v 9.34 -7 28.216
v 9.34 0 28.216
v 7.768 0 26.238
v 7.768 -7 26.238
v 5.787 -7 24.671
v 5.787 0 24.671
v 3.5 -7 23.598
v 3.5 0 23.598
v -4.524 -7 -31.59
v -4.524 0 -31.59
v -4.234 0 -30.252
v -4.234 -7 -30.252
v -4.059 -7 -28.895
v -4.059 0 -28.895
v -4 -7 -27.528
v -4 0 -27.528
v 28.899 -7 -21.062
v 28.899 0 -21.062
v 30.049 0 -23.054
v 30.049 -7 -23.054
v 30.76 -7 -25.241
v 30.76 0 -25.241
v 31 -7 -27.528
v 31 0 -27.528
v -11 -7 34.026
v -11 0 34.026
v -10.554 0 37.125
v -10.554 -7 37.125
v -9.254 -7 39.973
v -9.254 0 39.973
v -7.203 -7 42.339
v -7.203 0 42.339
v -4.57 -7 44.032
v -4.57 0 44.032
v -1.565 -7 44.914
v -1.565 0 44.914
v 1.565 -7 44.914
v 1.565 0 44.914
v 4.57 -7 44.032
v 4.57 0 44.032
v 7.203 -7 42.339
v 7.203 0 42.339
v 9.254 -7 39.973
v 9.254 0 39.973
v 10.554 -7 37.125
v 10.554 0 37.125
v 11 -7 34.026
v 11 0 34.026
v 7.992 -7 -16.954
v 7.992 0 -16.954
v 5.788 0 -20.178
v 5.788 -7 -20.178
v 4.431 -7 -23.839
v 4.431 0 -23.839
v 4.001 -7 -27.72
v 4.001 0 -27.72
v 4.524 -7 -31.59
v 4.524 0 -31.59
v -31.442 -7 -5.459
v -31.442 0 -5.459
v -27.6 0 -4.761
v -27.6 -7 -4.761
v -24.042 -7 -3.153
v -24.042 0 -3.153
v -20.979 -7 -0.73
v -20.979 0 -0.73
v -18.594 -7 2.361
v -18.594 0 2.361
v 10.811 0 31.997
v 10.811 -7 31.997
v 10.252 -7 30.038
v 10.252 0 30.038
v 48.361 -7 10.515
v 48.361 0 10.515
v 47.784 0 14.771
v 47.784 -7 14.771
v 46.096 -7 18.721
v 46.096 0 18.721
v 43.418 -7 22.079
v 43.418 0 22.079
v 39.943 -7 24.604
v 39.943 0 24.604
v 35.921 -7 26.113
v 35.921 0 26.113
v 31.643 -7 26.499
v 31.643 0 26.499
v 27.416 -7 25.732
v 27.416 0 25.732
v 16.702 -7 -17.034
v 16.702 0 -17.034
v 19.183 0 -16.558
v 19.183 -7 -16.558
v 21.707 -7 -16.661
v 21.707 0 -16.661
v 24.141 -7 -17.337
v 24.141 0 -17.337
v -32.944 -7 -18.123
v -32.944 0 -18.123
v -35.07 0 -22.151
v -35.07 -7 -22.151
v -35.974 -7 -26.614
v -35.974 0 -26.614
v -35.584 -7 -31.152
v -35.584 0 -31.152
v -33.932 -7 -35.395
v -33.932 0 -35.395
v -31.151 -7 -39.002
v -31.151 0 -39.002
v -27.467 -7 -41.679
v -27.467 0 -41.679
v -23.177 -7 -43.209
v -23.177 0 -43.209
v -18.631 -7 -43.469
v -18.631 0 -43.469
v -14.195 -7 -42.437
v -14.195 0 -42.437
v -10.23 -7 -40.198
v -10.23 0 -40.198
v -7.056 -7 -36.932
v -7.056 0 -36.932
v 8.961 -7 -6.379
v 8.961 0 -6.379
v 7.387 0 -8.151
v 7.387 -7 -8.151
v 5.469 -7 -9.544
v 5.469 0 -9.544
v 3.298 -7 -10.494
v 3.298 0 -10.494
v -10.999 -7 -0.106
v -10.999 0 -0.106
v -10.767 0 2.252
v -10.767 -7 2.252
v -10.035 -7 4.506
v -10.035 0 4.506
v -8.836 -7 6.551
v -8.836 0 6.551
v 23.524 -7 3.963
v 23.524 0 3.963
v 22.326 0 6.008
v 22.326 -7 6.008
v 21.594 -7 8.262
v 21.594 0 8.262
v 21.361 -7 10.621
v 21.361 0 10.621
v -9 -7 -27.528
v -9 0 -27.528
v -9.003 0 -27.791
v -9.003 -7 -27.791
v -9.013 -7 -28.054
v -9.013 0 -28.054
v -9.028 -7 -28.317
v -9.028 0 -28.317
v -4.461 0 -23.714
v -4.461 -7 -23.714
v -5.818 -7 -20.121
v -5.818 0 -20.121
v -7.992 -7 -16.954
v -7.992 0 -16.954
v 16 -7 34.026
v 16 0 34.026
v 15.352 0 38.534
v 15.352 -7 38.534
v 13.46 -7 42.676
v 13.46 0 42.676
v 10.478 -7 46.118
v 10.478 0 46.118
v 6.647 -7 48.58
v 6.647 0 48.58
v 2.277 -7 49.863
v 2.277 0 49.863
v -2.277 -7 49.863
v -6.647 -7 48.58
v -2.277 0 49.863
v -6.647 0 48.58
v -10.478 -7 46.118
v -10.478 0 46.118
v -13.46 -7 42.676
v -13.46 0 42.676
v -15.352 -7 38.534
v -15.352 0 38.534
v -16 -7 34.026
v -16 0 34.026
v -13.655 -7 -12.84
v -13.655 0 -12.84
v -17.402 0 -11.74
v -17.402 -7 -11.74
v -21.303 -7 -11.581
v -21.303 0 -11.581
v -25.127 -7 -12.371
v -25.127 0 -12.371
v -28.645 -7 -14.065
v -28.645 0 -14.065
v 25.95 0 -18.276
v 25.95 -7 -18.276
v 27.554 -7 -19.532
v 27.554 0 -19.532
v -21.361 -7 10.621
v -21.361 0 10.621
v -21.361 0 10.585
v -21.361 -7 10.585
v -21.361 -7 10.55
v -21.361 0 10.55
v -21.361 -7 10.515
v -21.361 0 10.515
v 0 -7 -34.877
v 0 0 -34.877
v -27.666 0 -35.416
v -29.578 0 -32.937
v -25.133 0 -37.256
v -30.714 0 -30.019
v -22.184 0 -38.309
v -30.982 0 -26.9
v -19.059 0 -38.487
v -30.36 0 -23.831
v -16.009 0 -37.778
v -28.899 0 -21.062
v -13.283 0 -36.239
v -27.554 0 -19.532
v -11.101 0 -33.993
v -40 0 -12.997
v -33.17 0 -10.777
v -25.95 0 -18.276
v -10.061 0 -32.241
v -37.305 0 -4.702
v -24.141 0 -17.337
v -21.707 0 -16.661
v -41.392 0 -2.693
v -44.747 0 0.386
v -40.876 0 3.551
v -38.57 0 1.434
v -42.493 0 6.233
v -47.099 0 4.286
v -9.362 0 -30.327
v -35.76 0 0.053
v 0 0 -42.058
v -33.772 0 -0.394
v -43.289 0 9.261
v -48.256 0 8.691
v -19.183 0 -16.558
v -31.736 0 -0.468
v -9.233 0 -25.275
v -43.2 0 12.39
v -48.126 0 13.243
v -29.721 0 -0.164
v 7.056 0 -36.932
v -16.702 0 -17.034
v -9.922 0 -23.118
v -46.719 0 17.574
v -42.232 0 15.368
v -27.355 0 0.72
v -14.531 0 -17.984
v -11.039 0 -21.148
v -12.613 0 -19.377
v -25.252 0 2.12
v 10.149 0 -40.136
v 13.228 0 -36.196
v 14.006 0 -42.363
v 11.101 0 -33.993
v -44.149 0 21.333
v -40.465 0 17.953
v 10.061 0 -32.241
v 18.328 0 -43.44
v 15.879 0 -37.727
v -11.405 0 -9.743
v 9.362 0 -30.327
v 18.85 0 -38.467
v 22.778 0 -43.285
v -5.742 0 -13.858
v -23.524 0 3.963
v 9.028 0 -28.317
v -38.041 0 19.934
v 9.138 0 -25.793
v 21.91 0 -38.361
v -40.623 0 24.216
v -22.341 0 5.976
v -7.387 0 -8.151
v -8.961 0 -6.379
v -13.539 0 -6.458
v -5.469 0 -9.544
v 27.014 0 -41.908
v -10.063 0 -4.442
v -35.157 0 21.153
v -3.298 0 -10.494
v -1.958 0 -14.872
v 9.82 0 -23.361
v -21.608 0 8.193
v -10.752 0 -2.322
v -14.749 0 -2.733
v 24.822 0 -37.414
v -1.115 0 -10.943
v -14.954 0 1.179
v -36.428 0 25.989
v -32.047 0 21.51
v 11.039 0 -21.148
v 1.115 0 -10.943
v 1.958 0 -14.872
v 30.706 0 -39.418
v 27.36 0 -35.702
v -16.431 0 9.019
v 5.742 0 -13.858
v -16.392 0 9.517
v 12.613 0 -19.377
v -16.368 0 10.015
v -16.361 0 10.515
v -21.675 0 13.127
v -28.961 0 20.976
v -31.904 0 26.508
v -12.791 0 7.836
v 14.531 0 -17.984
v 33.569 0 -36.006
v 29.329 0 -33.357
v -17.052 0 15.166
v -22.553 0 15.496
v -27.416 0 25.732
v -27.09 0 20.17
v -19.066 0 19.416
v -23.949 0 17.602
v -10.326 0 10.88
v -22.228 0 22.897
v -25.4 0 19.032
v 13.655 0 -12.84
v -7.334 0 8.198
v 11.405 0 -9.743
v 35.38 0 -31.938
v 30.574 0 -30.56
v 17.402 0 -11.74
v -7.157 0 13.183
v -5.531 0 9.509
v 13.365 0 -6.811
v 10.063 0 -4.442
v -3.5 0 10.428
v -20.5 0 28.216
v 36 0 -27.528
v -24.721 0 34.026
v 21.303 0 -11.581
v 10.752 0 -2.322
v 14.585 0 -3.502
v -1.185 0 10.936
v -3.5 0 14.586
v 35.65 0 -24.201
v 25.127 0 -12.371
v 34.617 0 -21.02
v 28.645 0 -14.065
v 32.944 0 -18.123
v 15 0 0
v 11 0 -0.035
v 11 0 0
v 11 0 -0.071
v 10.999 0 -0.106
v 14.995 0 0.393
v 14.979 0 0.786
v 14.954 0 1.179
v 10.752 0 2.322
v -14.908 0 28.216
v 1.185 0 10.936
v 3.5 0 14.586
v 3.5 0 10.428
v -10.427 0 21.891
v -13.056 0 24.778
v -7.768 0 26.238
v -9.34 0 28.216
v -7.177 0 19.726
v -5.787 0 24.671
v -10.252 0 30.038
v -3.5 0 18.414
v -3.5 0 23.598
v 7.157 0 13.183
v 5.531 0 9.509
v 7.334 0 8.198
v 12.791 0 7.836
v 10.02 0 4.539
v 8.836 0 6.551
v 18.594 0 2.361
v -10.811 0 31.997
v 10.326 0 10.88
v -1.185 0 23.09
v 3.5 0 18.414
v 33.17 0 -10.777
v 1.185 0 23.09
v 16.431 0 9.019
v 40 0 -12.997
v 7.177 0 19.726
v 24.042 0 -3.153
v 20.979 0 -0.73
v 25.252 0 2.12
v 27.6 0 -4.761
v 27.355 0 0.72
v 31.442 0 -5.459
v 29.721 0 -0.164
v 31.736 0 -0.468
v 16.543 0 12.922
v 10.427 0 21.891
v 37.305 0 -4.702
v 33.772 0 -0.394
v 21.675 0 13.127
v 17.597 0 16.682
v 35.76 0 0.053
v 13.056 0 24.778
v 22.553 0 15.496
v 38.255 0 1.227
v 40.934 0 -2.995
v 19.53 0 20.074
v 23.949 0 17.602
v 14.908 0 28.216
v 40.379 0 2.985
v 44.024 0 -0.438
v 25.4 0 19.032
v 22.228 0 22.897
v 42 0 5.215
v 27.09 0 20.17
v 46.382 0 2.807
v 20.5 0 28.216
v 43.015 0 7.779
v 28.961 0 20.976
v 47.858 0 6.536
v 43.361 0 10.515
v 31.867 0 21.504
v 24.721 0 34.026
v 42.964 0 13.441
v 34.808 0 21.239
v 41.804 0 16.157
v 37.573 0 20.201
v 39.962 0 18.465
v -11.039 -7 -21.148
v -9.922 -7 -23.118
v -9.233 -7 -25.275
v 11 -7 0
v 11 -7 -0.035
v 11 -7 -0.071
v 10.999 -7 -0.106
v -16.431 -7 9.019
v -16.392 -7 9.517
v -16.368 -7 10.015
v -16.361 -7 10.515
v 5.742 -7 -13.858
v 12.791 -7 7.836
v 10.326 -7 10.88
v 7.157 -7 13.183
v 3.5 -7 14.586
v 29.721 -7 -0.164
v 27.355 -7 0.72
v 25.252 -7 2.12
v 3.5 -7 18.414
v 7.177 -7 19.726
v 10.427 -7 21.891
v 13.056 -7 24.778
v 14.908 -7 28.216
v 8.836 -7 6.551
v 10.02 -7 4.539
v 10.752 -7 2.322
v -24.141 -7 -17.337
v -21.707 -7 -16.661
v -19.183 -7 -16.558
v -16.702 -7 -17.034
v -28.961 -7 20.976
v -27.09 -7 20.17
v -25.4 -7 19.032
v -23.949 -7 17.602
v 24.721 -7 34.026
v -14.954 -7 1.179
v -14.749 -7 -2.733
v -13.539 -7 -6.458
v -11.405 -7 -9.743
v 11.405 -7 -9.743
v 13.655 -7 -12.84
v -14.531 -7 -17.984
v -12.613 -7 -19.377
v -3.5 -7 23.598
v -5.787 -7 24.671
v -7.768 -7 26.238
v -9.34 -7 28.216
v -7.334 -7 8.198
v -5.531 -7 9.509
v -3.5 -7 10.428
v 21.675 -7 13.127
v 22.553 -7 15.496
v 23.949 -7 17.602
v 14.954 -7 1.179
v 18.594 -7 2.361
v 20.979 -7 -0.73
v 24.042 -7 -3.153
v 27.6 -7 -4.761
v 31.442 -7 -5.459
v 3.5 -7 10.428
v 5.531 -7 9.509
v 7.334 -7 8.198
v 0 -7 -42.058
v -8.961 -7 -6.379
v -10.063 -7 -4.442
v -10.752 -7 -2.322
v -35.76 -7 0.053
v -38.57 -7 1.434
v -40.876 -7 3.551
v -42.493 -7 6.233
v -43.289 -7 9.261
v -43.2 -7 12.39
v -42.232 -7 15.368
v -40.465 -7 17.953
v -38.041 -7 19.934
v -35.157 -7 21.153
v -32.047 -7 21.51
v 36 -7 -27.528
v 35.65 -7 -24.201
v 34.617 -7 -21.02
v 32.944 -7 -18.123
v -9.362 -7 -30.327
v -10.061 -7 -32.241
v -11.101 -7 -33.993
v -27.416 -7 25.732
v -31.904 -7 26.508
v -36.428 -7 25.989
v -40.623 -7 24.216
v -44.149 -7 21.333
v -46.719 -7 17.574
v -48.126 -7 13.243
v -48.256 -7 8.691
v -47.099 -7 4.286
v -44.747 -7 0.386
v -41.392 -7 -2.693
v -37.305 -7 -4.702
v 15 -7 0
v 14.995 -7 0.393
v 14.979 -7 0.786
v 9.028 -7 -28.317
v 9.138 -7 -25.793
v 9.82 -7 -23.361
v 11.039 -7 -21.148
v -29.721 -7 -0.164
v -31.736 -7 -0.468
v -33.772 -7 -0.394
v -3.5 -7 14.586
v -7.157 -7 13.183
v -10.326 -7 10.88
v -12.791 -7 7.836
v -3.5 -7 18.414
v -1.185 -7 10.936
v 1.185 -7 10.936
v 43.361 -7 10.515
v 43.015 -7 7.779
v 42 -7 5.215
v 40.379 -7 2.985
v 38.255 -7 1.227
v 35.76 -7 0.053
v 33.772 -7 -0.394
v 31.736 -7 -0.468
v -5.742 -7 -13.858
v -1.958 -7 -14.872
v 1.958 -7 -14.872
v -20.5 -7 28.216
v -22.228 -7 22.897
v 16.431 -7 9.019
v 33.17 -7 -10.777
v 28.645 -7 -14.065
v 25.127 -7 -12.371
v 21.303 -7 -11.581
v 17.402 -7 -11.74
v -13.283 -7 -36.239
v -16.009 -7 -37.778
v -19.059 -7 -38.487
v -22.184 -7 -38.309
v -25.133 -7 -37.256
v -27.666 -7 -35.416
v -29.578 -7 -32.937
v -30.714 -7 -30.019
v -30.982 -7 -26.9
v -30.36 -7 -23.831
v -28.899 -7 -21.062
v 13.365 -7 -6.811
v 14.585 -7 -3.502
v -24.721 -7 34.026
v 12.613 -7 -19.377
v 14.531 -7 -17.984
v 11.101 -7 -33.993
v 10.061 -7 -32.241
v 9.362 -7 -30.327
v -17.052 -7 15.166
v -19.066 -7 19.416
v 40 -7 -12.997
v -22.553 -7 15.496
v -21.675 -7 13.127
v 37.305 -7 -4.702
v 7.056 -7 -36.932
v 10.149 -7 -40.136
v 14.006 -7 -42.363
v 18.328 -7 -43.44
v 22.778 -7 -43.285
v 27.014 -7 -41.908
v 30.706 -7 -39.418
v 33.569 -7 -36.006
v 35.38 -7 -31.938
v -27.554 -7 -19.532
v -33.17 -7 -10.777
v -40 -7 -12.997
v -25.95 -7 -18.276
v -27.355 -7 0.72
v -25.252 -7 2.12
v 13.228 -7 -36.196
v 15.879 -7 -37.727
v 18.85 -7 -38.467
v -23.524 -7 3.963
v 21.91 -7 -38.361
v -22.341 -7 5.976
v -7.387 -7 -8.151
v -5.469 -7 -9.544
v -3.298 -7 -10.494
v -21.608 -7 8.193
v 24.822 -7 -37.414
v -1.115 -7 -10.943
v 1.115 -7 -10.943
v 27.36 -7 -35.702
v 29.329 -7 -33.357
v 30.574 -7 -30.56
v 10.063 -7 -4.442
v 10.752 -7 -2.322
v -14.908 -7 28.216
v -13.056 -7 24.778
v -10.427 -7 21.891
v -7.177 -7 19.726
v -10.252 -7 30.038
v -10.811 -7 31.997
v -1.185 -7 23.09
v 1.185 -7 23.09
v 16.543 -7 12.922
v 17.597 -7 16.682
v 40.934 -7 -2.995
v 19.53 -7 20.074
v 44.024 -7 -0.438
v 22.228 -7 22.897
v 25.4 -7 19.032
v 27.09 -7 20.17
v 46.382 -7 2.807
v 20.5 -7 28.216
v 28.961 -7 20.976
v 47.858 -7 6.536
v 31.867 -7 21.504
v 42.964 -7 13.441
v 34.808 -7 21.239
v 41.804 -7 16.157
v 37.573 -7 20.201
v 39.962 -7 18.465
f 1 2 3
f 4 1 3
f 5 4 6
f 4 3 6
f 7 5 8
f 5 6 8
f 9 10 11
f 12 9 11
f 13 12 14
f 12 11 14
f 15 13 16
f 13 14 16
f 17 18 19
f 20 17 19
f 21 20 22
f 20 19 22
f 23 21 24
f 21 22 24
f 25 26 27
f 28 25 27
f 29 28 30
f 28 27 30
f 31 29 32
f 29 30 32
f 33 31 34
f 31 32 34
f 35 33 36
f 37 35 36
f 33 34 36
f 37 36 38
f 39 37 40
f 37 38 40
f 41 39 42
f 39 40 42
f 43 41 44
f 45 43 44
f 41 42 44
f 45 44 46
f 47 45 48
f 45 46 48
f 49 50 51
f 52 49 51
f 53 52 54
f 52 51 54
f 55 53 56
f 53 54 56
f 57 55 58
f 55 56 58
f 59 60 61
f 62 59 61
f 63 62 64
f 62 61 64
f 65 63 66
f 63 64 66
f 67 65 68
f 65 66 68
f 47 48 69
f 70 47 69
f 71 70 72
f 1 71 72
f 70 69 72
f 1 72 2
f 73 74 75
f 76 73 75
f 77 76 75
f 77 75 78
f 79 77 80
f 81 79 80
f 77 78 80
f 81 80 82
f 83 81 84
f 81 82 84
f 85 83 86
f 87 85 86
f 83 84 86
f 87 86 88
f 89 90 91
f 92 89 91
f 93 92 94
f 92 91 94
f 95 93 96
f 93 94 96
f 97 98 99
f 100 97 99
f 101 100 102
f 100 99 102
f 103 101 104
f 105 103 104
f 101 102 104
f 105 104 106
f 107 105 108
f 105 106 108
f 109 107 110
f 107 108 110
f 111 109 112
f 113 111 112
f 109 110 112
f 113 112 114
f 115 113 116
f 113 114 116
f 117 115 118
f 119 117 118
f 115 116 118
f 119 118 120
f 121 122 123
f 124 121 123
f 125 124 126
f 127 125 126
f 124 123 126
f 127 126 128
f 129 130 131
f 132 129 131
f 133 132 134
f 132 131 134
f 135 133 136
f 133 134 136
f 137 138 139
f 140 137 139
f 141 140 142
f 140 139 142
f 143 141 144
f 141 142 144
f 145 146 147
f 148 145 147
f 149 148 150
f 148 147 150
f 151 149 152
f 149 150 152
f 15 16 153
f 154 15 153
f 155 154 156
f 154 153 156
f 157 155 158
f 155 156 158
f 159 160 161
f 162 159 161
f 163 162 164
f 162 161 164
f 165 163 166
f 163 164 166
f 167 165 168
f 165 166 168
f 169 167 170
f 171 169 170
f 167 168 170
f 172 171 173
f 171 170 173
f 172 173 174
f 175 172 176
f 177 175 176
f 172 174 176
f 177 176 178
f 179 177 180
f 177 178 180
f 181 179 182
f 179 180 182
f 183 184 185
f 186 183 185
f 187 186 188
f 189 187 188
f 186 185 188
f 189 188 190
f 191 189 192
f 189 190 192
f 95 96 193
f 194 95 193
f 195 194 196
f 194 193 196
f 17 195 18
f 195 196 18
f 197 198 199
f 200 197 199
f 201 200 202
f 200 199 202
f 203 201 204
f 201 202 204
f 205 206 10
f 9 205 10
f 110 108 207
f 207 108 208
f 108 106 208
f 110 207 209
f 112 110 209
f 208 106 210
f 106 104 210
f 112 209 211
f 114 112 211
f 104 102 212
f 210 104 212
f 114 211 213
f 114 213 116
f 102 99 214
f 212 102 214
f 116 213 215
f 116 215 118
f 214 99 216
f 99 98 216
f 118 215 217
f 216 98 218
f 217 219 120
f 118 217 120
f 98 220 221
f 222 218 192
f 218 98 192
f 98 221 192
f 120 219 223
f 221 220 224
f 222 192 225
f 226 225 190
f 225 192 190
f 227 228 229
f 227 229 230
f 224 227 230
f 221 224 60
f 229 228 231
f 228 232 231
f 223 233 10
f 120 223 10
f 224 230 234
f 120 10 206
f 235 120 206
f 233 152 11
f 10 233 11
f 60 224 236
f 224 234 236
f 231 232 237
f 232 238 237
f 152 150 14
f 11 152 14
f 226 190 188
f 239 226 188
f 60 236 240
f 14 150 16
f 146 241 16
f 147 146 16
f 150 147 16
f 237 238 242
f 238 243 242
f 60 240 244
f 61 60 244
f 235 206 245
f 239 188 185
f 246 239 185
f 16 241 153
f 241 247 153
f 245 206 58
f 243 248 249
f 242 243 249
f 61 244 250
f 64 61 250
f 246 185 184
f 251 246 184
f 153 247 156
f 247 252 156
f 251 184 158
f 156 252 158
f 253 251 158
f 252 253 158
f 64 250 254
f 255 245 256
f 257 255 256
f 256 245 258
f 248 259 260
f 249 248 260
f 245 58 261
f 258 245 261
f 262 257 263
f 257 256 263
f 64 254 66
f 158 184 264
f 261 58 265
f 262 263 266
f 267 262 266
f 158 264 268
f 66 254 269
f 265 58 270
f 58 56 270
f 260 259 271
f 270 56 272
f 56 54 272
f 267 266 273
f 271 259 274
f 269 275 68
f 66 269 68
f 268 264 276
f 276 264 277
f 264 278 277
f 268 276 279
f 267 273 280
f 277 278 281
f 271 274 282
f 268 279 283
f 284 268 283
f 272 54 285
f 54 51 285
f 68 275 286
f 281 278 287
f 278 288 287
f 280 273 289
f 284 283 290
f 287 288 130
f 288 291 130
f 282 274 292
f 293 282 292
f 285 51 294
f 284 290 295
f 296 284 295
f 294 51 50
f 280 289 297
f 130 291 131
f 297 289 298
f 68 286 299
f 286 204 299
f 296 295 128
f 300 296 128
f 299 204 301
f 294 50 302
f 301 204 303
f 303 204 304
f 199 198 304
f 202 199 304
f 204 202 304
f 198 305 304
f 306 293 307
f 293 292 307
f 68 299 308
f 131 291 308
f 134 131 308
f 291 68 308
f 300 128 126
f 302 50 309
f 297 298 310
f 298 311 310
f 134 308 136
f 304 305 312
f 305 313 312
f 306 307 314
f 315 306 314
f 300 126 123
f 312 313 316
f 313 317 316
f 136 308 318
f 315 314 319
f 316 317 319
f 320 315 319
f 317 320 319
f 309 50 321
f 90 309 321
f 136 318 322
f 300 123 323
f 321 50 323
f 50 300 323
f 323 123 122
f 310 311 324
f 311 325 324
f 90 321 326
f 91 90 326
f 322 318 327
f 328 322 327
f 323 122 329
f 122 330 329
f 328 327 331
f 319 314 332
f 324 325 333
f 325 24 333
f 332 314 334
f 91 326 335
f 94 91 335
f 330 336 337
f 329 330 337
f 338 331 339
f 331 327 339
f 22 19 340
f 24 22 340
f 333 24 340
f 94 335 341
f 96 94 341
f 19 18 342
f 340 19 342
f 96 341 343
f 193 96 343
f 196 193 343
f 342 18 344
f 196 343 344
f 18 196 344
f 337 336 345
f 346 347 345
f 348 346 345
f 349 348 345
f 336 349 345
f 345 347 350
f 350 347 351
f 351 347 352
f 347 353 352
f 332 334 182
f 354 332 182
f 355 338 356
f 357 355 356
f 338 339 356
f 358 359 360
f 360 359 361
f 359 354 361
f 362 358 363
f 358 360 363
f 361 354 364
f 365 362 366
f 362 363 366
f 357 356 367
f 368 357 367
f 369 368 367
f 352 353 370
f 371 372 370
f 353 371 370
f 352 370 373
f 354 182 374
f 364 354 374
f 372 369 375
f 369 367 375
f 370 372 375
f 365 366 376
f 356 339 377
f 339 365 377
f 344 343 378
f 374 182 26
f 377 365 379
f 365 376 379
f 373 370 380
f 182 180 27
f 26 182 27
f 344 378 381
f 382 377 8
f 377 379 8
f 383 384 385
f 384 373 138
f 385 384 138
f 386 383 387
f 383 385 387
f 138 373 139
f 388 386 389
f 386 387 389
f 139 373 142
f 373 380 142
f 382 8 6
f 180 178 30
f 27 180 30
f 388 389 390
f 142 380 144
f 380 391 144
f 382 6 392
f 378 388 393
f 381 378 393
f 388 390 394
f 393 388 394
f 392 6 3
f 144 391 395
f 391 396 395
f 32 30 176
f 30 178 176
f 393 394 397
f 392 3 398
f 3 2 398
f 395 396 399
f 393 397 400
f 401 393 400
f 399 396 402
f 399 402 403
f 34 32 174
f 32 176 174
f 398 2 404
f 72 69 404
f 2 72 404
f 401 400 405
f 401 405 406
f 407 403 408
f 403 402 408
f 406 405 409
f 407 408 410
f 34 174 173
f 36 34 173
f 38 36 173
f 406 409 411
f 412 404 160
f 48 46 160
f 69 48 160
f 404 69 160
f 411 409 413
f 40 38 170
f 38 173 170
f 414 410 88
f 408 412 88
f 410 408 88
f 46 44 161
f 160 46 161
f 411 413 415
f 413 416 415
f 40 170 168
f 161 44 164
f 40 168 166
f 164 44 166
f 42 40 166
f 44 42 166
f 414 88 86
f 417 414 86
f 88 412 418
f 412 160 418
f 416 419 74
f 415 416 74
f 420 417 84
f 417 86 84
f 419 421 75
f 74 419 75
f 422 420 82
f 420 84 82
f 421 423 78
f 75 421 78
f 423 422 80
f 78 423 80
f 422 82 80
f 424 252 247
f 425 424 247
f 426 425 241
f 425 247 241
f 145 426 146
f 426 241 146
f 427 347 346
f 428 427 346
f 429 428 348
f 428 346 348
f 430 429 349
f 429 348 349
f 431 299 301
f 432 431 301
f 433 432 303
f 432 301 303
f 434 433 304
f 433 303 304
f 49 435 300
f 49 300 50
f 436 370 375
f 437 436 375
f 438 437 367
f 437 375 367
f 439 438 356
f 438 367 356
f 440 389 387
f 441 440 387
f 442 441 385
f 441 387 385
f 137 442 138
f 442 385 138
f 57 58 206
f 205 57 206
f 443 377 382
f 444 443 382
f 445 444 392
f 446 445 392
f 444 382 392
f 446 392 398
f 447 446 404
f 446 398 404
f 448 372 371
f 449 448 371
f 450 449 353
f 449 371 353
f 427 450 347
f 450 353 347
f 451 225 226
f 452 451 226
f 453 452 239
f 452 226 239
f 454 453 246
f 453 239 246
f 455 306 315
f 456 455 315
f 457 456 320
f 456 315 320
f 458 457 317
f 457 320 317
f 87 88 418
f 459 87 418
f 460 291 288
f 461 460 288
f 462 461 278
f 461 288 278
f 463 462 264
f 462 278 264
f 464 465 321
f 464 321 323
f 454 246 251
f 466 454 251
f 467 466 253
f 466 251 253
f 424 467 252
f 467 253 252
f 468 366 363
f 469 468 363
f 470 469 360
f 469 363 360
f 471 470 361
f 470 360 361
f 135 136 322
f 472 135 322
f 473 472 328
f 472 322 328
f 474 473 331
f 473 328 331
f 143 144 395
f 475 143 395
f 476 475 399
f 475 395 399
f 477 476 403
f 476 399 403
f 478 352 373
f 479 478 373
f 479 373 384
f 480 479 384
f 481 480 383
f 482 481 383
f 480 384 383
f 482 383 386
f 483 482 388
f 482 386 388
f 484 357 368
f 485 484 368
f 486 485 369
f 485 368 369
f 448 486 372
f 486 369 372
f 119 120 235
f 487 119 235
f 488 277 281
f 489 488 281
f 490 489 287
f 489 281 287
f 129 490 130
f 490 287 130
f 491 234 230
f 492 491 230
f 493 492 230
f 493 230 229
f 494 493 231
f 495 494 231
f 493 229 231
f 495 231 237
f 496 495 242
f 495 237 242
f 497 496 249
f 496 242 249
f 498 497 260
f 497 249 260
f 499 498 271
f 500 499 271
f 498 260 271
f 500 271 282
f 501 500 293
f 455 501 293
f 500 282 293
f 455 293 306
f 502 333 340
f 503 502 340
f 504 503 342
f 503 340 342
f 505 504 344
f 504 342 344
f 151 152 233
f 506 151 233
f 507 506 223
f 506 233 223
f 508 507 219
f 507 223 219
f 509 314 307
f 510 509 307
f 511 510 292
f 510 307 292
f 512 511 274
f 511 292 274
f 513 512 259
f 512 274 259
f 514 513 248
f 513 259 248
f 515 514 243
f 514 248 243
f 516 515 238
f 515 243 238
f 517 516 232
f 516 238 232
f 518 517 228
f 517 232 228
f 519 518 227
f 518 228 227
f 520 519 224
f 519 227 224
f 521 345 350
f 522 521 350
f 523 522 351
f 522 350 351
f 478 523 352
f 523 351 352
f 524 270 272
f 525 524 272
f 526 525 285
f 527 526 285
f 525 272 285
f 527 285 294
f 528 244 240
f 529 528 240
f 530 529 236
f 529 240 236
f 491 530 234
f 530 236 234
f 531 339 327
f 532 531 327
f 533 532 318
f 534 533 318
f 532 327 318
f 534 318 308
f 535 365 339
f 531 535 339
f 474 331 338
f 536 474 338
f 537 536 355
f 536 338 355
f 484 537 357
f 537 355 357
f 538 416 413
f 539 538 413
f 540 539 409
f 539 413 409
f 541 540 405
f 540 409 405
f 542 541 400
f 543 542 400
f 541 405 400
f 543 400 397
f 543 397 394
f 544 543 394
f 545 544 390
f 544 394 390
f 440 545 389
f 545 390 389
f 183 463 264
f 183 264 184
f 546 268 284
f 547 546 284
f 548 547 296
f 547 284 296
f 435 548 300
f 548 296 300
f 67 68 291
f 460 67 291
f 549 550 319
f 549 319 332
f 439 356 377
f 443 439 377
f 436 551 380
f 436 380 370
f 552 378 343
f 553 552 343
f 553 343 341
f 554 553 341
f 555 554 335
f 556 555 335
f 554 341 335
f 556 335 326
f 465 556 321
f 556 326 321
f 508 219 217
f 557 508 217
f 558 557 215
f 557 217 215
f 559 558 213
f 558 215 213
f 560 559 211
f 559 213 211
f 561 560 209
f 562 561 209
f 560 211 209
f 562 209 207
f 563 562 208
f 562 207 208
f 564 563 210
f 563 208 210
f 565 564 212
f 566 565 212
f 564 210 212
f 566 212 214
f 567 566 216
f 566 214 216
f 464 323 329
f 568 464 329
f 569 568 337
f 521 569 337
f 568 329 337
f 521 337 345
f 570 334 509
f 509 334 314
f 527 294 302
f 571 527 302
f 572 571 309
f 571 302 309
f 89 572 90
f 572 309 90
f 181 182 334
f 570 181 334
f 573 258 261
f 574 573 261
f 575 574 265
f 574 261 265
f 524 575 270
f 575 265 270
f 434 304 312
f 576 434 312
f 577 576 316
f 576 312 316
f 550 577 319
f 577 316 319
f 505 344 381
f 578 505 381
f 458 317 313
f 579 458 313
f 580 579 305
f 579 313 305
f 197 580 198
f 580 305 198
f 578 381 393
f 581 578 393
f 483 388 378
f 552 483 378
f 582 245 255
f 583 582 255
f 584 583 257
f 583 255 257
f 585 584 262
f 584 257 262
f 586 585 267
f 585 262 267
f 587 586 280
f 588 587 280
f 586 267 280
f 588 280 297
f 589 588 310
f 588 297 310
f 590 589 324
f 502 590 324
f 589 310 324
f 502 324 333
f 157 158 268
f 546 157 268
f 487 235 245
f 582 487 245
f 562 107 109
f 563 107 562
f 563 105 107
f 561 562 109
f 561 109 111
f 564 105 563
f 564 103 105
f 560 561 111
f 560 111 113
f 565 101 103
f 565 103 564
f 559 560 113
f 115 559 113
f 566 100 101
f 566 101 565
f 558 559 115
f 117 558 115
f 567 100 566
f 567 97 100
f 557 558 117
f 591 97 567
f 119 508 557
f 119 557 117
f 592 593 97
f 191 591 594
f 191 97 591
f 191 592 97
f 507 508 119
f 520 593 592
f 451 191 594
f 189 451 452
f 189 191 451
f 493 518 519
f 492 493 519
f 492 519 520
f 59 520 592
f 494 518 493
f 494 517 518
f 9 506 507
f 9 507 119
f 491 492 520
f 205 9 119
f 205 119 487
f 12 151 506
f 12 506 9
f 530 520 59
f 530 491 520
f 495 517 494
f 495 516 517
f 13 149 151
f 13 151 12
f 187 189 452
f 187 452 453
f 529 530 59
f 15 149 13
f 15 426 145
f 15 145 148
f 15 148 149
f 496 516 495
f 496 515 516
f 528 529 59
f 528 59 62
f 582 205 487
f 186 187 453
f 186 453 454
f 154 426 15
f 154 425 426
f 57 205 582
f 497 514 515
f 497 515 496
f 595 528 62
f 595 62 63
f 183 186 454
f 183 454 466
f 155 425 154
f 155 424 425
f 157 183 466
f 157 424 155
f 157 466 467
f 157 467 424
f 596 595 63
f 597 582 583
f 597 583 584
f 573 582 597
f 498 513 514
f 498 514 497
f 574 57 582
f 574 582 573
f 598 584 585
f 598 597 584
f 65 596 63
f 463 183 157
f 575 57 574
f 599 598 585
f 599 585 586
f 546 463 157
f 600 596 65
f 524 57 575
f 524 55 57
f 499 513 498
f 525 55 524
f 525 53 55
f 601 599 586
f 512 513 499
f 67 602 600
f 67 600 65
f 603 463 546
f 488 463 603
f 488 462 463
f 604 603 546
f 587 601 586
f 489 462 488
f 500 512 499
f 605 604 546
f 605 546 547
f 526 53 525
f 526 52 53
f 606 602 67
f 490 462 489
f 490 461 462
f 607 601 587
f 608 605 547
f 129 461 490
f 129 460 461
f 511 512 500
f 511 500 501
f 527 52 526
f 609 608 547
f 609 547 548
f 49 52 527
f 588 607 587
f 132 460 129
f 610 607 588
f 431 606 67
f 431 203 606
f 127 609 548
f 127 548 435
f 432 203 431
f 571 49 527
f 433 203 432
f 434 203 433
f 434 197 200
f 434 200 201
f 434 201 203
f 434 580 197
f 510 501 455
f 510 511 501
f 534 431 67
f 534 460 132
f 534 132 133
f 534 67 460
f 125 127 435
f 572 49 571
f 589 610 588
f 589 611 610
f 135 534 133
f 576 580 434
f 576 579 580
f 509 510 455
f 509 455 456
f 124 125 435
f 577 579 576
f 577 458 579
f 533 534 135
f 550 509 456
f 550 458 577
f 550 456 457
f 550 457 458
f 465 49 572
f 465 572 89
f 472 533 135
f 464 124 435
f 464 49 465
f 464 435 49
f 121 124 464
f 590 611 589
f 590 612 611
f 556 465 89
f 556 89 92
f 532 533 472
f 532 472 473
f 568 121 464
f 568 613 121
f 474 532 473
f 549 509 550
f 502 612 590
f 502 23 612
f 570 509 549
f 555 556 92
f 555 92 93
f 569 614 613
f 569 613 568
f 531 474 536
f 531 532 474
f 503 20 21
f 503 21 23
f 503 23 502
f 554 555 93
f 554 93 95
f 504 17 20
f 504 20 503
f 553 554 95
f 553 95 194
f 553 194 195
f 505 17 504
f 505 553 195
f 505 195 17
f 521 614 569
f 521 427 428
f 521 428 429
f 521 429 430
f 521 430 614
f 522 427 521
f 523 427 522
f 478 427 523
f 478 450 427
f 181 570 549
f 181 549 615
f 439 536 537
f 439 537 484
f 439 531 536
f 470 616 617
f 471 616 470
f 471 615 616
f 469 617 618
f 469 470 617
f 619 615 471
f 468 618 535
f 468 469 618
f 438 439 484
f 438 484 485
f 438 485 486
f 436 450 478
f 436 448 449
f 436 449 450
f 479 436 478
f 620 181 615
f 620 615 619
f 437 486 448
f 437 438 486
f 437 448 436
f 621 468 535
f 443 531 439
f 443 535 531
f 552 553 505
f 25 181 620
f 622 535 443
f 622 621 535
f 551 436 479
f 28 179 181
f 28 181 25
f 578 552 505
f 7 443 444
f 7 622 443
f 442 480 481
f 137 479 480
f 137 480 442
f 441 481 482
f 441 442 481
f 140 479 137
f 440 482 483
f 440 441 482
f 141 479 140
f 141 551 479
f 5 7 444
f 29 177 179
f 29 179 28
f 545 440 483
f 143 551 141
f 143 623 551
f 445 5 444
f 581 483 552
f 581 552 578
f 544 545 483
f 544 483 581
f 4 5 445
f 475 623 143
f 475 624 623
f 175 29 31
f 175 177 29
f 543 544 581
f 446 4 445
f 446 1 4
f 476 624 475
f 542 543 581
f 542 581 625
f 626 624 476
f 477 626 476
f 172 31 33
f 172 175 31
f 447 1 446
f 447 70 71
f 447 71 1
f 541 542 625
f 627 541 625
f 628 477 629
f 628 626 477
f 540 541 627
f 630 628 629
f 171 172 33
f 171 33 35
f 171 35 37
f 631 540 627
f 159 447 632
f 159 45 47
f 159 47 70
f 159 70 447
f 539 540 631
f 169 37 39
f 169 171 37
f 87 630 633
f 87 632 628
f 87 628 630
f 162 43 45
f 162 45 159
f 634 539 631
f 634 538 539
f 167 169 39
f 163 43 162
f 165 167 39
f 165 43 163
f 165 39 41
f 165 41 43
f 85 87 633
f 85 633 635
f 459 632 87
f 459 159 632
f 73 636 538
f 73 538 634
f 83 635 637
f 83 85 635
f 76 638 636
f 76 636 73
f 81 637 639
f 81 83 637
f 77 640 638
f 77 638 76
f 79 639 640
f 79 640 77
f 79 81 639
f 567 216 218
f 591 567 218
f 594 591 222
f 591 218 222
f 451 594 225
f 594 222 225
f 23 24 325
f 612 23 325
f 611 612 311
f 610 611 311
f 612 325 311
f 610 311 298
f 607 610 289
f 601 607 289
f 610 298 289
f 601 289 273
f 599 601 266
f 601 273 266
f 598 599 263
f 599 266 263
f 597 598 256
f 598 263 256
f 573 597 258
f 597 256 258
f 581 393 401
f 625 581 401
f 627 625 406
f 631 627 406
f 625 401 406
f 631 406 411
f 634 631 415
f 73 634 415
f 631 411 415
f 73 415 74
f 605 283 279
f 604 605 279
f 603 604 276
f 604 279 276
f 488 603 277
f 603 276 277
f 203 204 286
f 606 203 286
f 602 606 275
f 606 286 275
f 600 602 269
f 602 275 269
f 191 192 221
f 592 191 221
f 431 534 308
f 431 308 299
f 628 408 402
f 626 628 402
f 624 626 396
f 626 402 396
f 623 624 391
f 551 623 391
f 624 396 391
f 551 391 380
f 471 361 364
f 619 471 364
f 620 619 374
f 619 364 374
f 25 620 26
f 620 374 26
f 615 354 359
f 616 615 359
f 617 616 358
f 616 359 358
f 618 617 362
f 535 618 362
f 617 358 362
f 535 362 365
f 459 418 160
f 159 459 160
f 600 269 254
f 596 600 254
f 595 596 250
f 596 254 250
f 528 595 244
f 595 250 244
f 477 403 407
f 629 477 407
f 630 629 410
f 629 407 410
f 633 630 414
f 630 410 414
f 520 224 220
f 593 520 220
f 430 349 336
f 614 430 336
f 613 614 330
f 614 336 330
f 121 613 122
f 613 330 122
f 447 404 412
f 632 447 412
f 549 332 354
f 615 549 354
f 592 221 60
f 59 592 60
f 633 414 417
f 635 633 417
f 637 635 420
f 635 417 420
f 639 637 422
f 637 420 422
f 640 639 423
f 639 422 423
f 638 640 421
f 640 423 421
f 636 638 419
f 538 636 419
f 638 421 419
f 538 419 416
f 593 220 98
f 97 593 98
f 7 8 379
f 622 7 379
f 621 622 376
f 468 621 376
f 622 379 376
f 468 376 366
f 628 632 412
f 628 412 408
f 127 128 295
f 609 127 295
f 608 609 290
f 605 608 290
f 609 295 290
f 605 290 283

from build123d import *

# Parameters (mm, degrees)
F1_DEPTH = 7


with BuildPart() as f1:
    # F0 (on Front) → F1 (new body)
    with BuildSketch(Plane.XZ):
        with BuildLine():
            ThreePointArc((48.360679775, 10.5146222424), (41.7652438117, 23.4588941524), (27.416407865, 25.7315265031))
            Line((27.416407865, 25.7315265031), (28.9614928369, 20.9762439216))
            ThreePointArc((28.9614928369, 20.9762439216), (38.8263175502, 19.4138091805), (43.360679775, 10.5146222424))
            ThreePointArc((43.360679775, 10.5146222424), (41.2598667131, 4.0489844672), (35.7598667131, 0.0530005631))
            Line((35.7598667131, 0.0530005631), (37.304951685, -4.7022820183))
            ThreePointArc((37.304951685, -4.7022820183), (45.304951685, 1.1100582057), (48.360679775, 10.5146222424))
        make_face()
        with BuildLine():
            ThreePointArc((27.416407865, 25.7315265031), (24.6902095954, 24.5561281169), (22.2280947787, 22.8973005186))
            Line((22.2280947787, 22.8973005186), (23.9485313704, 17.6023411434))
            ThreePointArc((23.9485313704, 17.6023411434), (26.2187976829, 19.6402610894), (28.9614928369, 20.9762439216))
            Line((28.9614928369, 20.9762439216), (27.416407865, 25.7315265031))
        make_face()
        with BuildLine():
            ThreePointArc((22.2280947787, 22.8973005186), (17.5969797386, 16.6817253902), (16.4307551931, 9.0187937711))
            Line((16.4307551931, 9.0187937711), (21.3611921305, 10.6207898431))
            ThreePointArc((21.3611921305, 10.6207898431), (22.0462036291, 14.3371321293), (23.9485313704, 17.6023411434))
            Line((23.9485313704, 17.6023411434), (22.2280947787, 22.8973005186))
        make_face()
        with BuildLine():
            Line((21.3611921305, 10.6207898431), (16.4307551931, 9.0187937711))
            ThreePointArc((16.4307551931, 9.0187937711), (17.1437755143, 5.5703503324), (18.5938741537, 2.361398157))
            Line((18.5938741537, 2.361398157), (23.5243110912, 3.963394229))
            ThreePointArc((23.5243110912, 3.963394229), (21.8990580958, 7.1154353043), (21.3611921305, 10.6207898431))
        make_face()
        with BuildLine():
            Line((29.7211653989, -0.1639995722), (31.4416019907, -5.4589589474))
            ThreePointArc((31.4416019907, -5.4589589474), (34.4085291179, -5.3537838864), (37.304951685, -4.7022820183))
            Line((37.304951685, -4.7022820183), (35.7598667131, 0.0530005631))
            ThreePointArc((35.7598667131, 0.0530005631), (32.7557087171, -0.4782823845), (29.7211653989, -0.1639995722))
        make_face()
        with BuildLine():
            Line((23.5243110912, 3.963394229), (18.5938741537, 2.361398157))
            ThreePointArc((18.5938741537, 2.361398157), (24.0415278254, -3.1525541609), (31.4416019907, -5.4589589474))
            Line((31.4416019907, -5.4589589474), (29.7211653989, -0.1639995722))
            ThreePointArc((29.7211653989, -0.1639995722), (26.2629082231, 1.359449819), (23.5243110912, 3.963394229))
        make_face()
        with BuildLine():
            ThreePointArc((37.304951685, -4.7022820183), (34.4085291179, -5.3537838864), (31.4416019907, -5.4589589474))
            Line((31.4416019907, -5.4589589474), (33.1696967694, -10.7774877984))
            Line((33.1696967694, -10.7774877984), (28.645485903, -14.0645193985))
            ThreePointArc((28.645485903, -14.0645193985), (30.9839600202, -15.8935238202), (32.94427191, -18.1230743727))
            Line((32.94427191, -18.1230743727), (40, -12.9967878493))
            Line((40, -12.9967878493), (37.304951685, -4.7022820183))
        make_face()
        with BuildLine():
            ThreePointArc((36, -27.5276384094), (35.2169042607, -22.5833664994), (32.94427191, -18.1230743727))
            Line((32.94427191, -18.1230743727), (28.8991869381, -21.0620006342))
            ThreePointArc((28.8991869381, -21.0620006342), (30.4616216792, -24.1284514713), (31, -27.5276384094))
            ThreePointArc((31, -27.5276384094), (23.3991869381, -37.9892600887), (11.1008130619, -33.9932761846))
            Line((11.1008130619, -33.9932761846), (7.05572809, -36.9322024461))
            ThreePointArc((7.05572809, -36.9322024461), (24.94427191, -42.7445426701), (36, -27.5276384094))
        make_face()
        with BuildLine():
            ThreePointArc((32.94427191, -18.1230743727), (30.9839600202, -15.8935238202), (28.645485903, -14.0645193985))
            Line((28.645485903, -14.0645193985), (24.1413244303, -17.3369842615))
            ThreePointArc((24.1413244303, -17.3369842615), (26.7810523469, -18.8663839351), (28.8991869381, -21.0620006342))
            Line((28.8991869381, -21.0620006342), (32.94427191, -18.1230743727))
        make_face()
        with BuildLine():
            ThreePointArc((28.645485903, -14.0645193985), (21.3030294243, -11.5807856065), (13.6547651702, -12.83961625))
            Line((13.6547651702, -12.83961625), (16.7019427769, -17.0336964164))
            ThreePointArc((16.7019427769, -17.0336964164), (20.4480745194, -16.5367681425), (24.1413244303, -17.3369842615))
            Line((24.1413244303, -17.3369842615), (28.645485903, -14.0645193985))
        make_face()
        with BuildLine():
            Line((16.7019427769, -17.0336964164), (13.6547651702, -12.83961625))
            ThreePointArc((13.6547651702, -12.83961625), (10.5954359633, -14.5833664994), (7.9916462096, -16.9541130161))
            Line((7.9916462096, -16.9541130161), (11.0388238163, -21.1481931824))
            ThreePointArc((11.0388238163, -21.1481931824), (13.5343622248, -18.6284514713), (16.7019427769, -17.0336964164))
        make_face()
        with BuildLine():
            Line((11.0388238163, -21.1481931824), (7.9916462096, -16.9541130161))
            ThreePointArc((7.9916462096, -16.9541130161), (4.4309834911, -23.8390445115), (4.5242108664, -31.5896515423))
            Line((4.5242108664, -31.5896515423), (9.0283723391, -28.3171866794))
            ThreePointArc((9.0283723391, -28.3171866794), (9.4085985716, -24.5574169054), (11.0388238163, -21.1481931824))
        make_face()
        with BuildLine():
            Line((9.0283723391, -28.3171866794), (4.5242108664, -31.5896515423))
            ThreePointArc((4.5242108664, -31.5896515423), (5.5410691968, -34.3788660388), (7.05572809, -36.9322024461))
            Line((7.05572809, -36.9322024461), (11.1008130619, -33.9932761846))
            ThreePointArc((11.1008130619, -33.9932761846), (9.667197078, -31.3003276061), (9.0283723391, -28.3171866794))
        make_face()
        with BuildLine():
            ThreePointArc((-7.05572809, -36.9322024461), (-5.5410691968, -34.3788660388), (-4.5242108664, -31.5896515423))
            Line((-4.5242108664, -31.5896515423), (-9.0283723391, -28.3171866794))
            ThreePointArc((-9.0283723391, -28.3171866794), (-9.667197078, -31.3003276061), (-11.1008130619, -33.9932761846))
            Line((-11.1008130619, -33.9932761846), (-7.05572809, -36.9322024461))
        make_face()
        with BuildLine():
            Line((-28.8991869381, -21.0620006342), (-32.94427191, -18.1230743727))
            ThreePointArc((-32.94427191, -18.1230743727), (-29.4045640367, -40.4719103194), (-7.05572809, -36.9322024461))
            Line((-7.05572809, -36.9322024461), (-11.1008130619, -33.9932761846))
            ThreePointArc((-11.1008130619, -33.9932761846), (-26.4656377752, -36.4268253475), (-28.8991869381, -21.0620006342))
        make_face()
        with BuildLine():
            ThreePointArc((-4, -27.5276384094), (-5.031137975, -21.8766942692), (-7.9916462096, -16.9541130161))
            Line((-7.9916462096, -16.9541130161), (-11.0388238163, -21.1481931824))
            ThreePointArc((-11.0388238163, -21.1481931824), (-9.5220961538, -24.1789773353), (-9, -27.5276384094))
            ThreePointArc((-9, -27.5276384094), (-9.0070953732, -27.9226673515), (-9.0283723391, -28.3171866794))
            Line((-9.0283723391, -28.3171866794), (-4.5242108664, -31.5896515423))
            ThreePointArc((-4.5242108664, -31.5896515423), (-4.1315938712, -29.5754877523), (-4, -27.5276384094))
        make_face()
        with BuildLine():
            Line((-11.0388238163, -21.1481931824), (-7.9916462096, -16.9541130161))
            ThreePointArc((-7.9916462096, -16.9541130161), (-10.5954359633, -14.5833664994), (-13.6547651702, -12.83961625))
            Line((-13.6547651702, -12.83961625), (-16.7019427769, -17.0336964164))
            ThreePointArc((-16.7019427769, -17.0336964164), (-13.5343622248, -18.6284514713), (-11.0388238163, -21.1481931824))
        make_face()
        with BuildLine():
            Line((-16.7019427769, -17.0336964164), (-13.6547651702, -12.83961625))
            ThreePointArc((-13.6547651702, -12.83961625), (-21.3030294243, -11.5807856065), (-28.645485903, -14.0645193985))
            Line((-28.645485903, -14.0645193985), (-24.1413244303, -17.3369842615))
            ThreePointArc((-24.1413244303, -17.3369842615), (-20.4480745194, -16.5367681425), (-16.7019427769, -17.0336964164))
        make_face()
        with BuildLine():
            Line((-24.1413244303, -17.3369842615), (-28.645485903, -14.0645193985))
            ThreePointArc((-28.645485903, -14.0645193985), (-30.9839600202, -15.8935238202), (-32.94427191, -18.1230743727))
            Line((-32.94427191, -18.1230743727), (-28.8991869381, -21.0620006342))
            ThreePointArc((-28.8991869381, -21.0620006342), (-26.7810523469, -18.8663839351), (-24.1413244303, -17.3369842615))
        make_face()
        with BuildLine():
            ThreePointArc((-37.304951685, -4.7022820183), (-34.4085291179, -5.3537838864), (-31.4416019907, -5.4589589474))
            Line((-31.4416019907, -5.4589589474), (-29.7211653989, -0.1639995722))
            ThreePointArc((-29.7211653989, -0.1639995722), (-32.7557087171, -0.4782823845), (-35.7598667131, 0.0530005631))
            Line((-35.7598667131, 0.0530005631), (-37.304951685, -4.7022820183))
        make_face()
        with BuildLine():
            ThreePointArc((-31.4416019907, -5.4589589474), (-24.0415278254, -3.1525541609), (-18.5938741537, 2.361398157))
            Line((-18.5938741537, 2.361398157), (-23.5243110912, 3.963394229))
            ThreePointArc((-23.5243110912, 3.963394229), (-26.2629082231, 1.359449819), (-29.7211653989, -0.1639995722))
            Line((-29.7211653989, -0.1639995722), (-31.4416019907, -5.4589589474))
        make_face()
        with BuildLine():
            Line((-21.3611921305, 10.6207898431), (-16.4307551931, 9.0187937711))
            ThreePointArc((-16.4307551931, 9.0187937711), (-16.378208231, 9.7658877467), (-16.360679775, 10.5146222424))
            ThreePointArc((-16.360679775, 10.5146222424), (-17.9017489718, 17.3658498718), (-22.2280947787, 22.8973005186))
            Line((-22.2280947787, 22.8973005186), (-23.9485313704, 17.6023411434))
            ThreePointArc((-23.9485313704, 17.6023411434), (-22.0462036291, 14.3371321293), (-21.3611921305, 10.6207898431))
        make_face()
        with BuildLine():
            Line((-23.9485313704, 17.6023411434), (-22.2280947787, 22.8973005186))
            ThreePointArc((-22.2280947787, 22.8973005186), (-24.6902095954, 24.5561281169), (-27.416407865, 25.7315265031))
            Line((-27.416407865, 25.7315265031), (-28.9614928369, 20.9762439216))
            ThreePointArc((-28.9614928369, 20.9762439216), (-26.2187976829, 19.6402610894), (-23.9485313704, 17.6023411434))
        make_face()
        with BuildLine():
            ThreePointArc((-27.416407865, 25.7315265031), (-47.5775840357, 15.4588941524), (-37.304951685, -4.7022820183))
            Line((-37.304951685, -4.7022820183), (-35.7598667131, 0.0530005631))
            ThreePointArc((-35.7598667131, 0.0530005631), (-42.8223014542, 13.9138091805), (-28.9614928369, 20.9762439216))
            Line((-28.9614928369, 20.9762439216), (-27.416407865, 25.7315265031))
        make_face()
        with BuildLine():
            Line((11, 34.0260323341), (16, 34.0260323341))
            ThreePointArc((16, 34.0260323341), (0, 50.0260323341), (-16, 34.0260323341))
            Line((-16, 34.0260323341), (-11, 34.0260323341))
            ThreePointArc((-11, 34.0260323341), (0, 45.0260323341), (11, 34.0260323341))
        make_face()
        with BuildLine():
            Line((9.3403180627, 28.2158293697), (14.9077678246, 28.2158293697))
            ThreePointArc((14.9077678246, 28.2158293697), (15.7245713009, 31.0700456286), (16, 34.0260323341))
            Line((16, 34.0260323341), (11, 34.0260323341))
            ThreePointArc((11, 34.0260323341), (10.5769442347, 31.0047328363), (9.3403180627, 28.2158293697))
        make_face()
        with BuildLine():
            Line((3.5, 23.5977055268), (3.5, 18.4135373381))
            ThreePointArc((3.5, 18.4135373381), (10.4274978465, 21.8906588886), (14.9077678246, 28.2158293697))
            Line((14.9077678246, 28.2158293697), (9.3403180627, 28.2158293697))
            ThreePointArc((9.3403180627, 28.2158293697), (6.8227713537, 25.3976030996), (3.5, 23.5977055268))
        make_face()
        with BuildLine():
            ThreePointArc((-14.9077678246, 28.2158293697), (-10.4274978465, 21.8906588886), (-3.5, 18.4135373381))
            Line((-3.5, 18.4135373381), (-3.5, 23.5977055268))
            ThreePointArc((-3.5, 23.5977055268), (-6.8227713537, 25.3976030996), (-9.3403180627, 28.2158293697))
            Line((-9.3403180627, 28.2158293697), (-14.9077678246, 28.2158293697))
        make_face()
        with BuildLine():
            ThreePointArc((-16, 34.0260323341), (-15.7245713009, 31.0700456286), (-14.9077678246, 28.2158293697))
            Line((-14.9077678246, 28.2158293697), (-9.3403180627, 28.2158293697))
            ThreePointArc((-9.3403180627, 28.2158293697), (-10.5769442347, 31.0047328363), (-11, 34.0260323341))
            Line((-11, 34.0260323341), (-16, 34.0260323341))
        make_face()
        with BuildLine():
            ThreePointArc((-3.5, 18.4135373381), (0, 18.0260323341), (3.5, 18.4135373381))
            Line((3.5, 18.4135373381), (3.5, 23.5977055268))
            ThreePointArc((3.5, 23.5977055268), (0, 23.0260323341), (-3.5, 23.5977055268))
            Line((-3.5, 23.5977055268), (-3.5, 18.4135373381))
        make_face()
        with BuildLine():
            ThreePointArc((-18.5938741537, 2.361398157), (-17.1437755143, 5.5703503324), (-16.4307551931, 9.0187937711))
            Line((-16.4307551931, 9.0187937711), (-21.3611921305, 10.6207898431))
            ThreePointArc((-21.3611921305, 10.6207898431), (-21.3608078646, 10.5677066609), (-21.360679775, 10.5146222424))
            ThreePointArc((-21.360679775, 10.5146222424), (-21.9155839037, 7.064988604), (-23.5243110912, 3.963394229))
            Line((-23.5243110912, 3.963394229), (-18.5938741537, 2.361398157))
        make_face()
        with BuildLine():
            ThreePointArc((-14.953624315, 1.1786092852), (-14.2658477444, 4.6352549156), (-12.7905053543, 7.8360048992))
            Line((-12.7905053543, 7.8360048992), (-16.4307551931, 9.0187937711))
            ThreePointArc((-16.4307551931, 9.0187937711), (-17.1437755143, 5.5703503324), (-18.5938741537, 2.361398157))
            Line((-18.5938741537, 2.361398157), (-14.953624315, 1.1786092852))
        make_face()
        with BuildLine():
            ThreePointArc((-10.9994876445, -0.1061676007), (-10.4616216792, 3.3991869381), (-8.8363686838, 6.5512280134))
            Line((-8.8363686838, 6.5512280134), (-12.7905053543, 7.8360048992))
            ThreePointArc((-12.7905053543, 7.8360048992), (-14.2658477444, 4.6352549156), (-14.953624315, 1.1786092852))
            Line((-14.953624315, 1.1786092852), (-10.9994876445, -0.1061676007))
        make_face()
        with BuildLine():
            ThreePointArc((-8.9611761837, -6.379445227), (-10.4616216792, -3.3991869381), (-10.9994876445, -0.1061676007))
            Line((-10.9994876445, -0.1061676007), (-14.953624315, 1.1786092852))
            ThreePointArc((-14.953624315, 1.1786092852), (-14.2658477444, -4.6352549156), (-11.4049670423, -9.7430347821))
            Line((-11.4049670423, -9.7430347821), (-8.9611761837, -6.379445227))
        make_face()
        with BuildLine():
            Line((-5.7418480816, -13.8575315481), (-3.2980572231, -10.493941993))
            ThreePointArc((-3.2980572231, -10.493941993), (-6.4656377752, -8.8991869381), (-8.9611761837, -6.379445227))
            Line((-8.9611761837, -6.379445227), (-11.4049670423, -9.7430347821))
            ThreePointArc((-11.4049670423, -9.7430347821), (-8.8167787844, -12.1352549156), (-5.7418480816, -13.8575315481))
        make_face()
        with BuildLine():
            Line((-7.9916462096, -16.9541130161), (-5.7418480816, -13.8575315481))
            ThreePointArc((-5.7418480816, -13.8575315481), (-8.8167787844, -12.1352549156), (-11.4049670423, -9.7430347821))
            Line((-11.4049670423, -9.7430347821), (-13.6547651702, -12.83961625))
            ThreePointArc((-13.6547651702, -12.83961625), (-10.5954359633, -14.5833664994), (-7.9916462096, -16.9541130161))
        make_face()
        with BuildLine():
            Line((11.4049670423, -9.7430347821), (8.9611761837, -6.379445227))
            ThreePointArc((8.9611761837, -6.379445227), (6.4656377752, -8.8991869381), (3.2980572231, -10.493941993))
            Line((3.2980572231, -10.493941993), (5.7418480816, -13.8575315481))
            ThreePointArc((5.7418480816, -13.8575315481), (8.8167787844, -12.1352549156), (11.4049670423, -9.7430347821))
        make_face()
        with BuildLine():
            Line((5.7418480816, -13.8575315481), (3.2980572231, -10.493941993))
            ThreePointArc((3.2980572231, -10.493941993), (0, -11), (-3.2980572231, -10.493941993))
            Line((-3.2980572231, -10.493941993), (-5.7418480816, -13.8575315481))
            ThreePointArc((-5.7418480816, -13.8575315481), (0, -15), (5.7418480816, -13.8575315481))
        make_face()
        with BuildLine():
            ThreePointArc((8.8363686838, 6.5512280134), (10.4450958713, 3.4496336384), (11, 0))
            ThreePointArc((11, 0), (10.9998719104, -0.0530844185), (10.9994876445, -0.1061676007))
            Line((10.9994876445, -0.1061676007), (14.953624315, 1.1786092852))
            ThreePointArc((14.953624315, 1.1786092852), (14.2658477444, 4.6352549156), (12.7905053543, 7.8360048992))
            Line((12.7905053543, 7.8360048992), (8.8363686838, 6.5512280134))
        make_face()
        with BuildLine():
            Line((16.4307551931, 9.0187937711), (12.7905053543, 7.8360048992))
            ThreePointArc((12.7905053543, 7.8360048992), (14.2658477444, 4.6352549156), (14.953624315, 1.1786092852))
            Line((14.953624315, 1.1786092852), (18.5938741537, 2.361398157))
            ThreePointArc((18.5938741537, 2.361398157), (17.1437755143, 5.5703503324), (16.4307551931, 9.0187937711))
        make_face()
        with BuildLine():
            ThreePointArc((3.5, 10.4283268073), (6.4656377752, 8.8991869381), (8.8363686838, 6.5512280134))
            Line((8.8363686838, 6.5512280134), (12.7905053543, 7.8360048992))
            ThreePointArc((12.7905053543, 7.8360048992), (8.8167787844, 12.1352549156), (3.5, 14.5859521458))
            Line((3.5, 14.5859521458), (3.5, 10.4283268073))
        make_face()
        with BuildLine():
            ThreePointArc((-3.5, 10.4283268073), (0, 11), (3.5, 10.4283268073))
            Line((3.5, 10.4283268073), (3.5, 14.5859521458))
            ThreePointArc((3.5, 14.5859521458), (0, 15), (-3.5, 14.5859521458))
            Line((-3.5, 14.5859521458), (-3.5, 10.4283268073))
        make_face()
        with BuildLine():
            ThreePointArc((-3.5, 14.5859521458), (0, 15), (3.5, 14.5859521458))
            Line((3.5, 14.5859521458), (3.5, 18.4135373381))
            ThreePointArc((3.5, 18.4135373381), (0, 18.0260323341), (-3.5, 18.4135373381))
            Line((-3.5, 18.4135373381), (-3.5, 14.5859521458))
        make_face()
        with BuildLine():
            ThreePointArc((-8.8363686838, 6.5512280134), (-6.4656377752, 8.8991869381), (-3.5, 10.4283268073))
            Line((-3.5, 10.4283268073), (-3.5, 14.5859521458))
            ThreePointArc((-3.5, 14.5859521458), (-8.8167787844, 12.1352549156), (-12.7905053543, 7.8360048992))
            Line((-12.7905053543, 7.8360048992), (-8.8363686838, 6.5512280134))
        make_face()
        with BuildLine():
            Line((14.953624315, 1.1786092852), (10.9994876445, -0.1061676007))
            ThreePointArc((10.9994876445, -0.1061676007), (10.4616216792, -3.3991869381), (8.9611761837, -6.379445227))
            Line((8.9611761837, -6.379445227), (11.4049670423, -9.7430347821))
            ThreePointArc((11.4049670423, -9.7430347821), (14.0725709384, -5.1925665314), (15, 0))
            ThreePointArc((15, 0), (14.9884015946, 0.5897606615), (14.953624315, 1.1786092852))
        make_face()
        with BuildLine():
            Line((20.5, 28.2158293697), (22.2280947787, 22.8973005186))
            ThreePointArc((22.2280947787, 22.8973005186), (24.6902095954, 24.5561281169), (27.416407865, 25.7315265031))
            Line((27.416407865, 25.7315265031), (24.72135955, 34.0260323341))
            Line((24.72135955, 34.0260323341), (16, 34.0260323341))
            ThreePointArc((16, 34.0260323341), (15.7245713009, 31.0700456286), (14.9077678246, 28.2158293697))
            Line((14.9077678246, 28.2158293697), (20.5, 28.2158293697))
        make_face()
        with BuildLine():
            Line((-20.5, 28.2158293697), (-14.9077678246, 28.2158293697))
            ThreePointArc((-14.9077678246, 28.2158293697), (-15.7245713009, 31.0700456286), (-16, 34.0260323341))
            Line((-16, 34.0260323341), (-24.72135955, 34.0260323341))
            Line((-24.72135955, 34.0260323341), (-27.416407865, 25.7315265031))
            ThreePointArc((-27.416407865, 25.7315265031), (-24.6902095954, 24.5561281169), (-22.2280947787, 22.8973005186))
            Line((-22.2280947787, 22.8973005186), (-20.5, 28.2158293697))
        make_face()
        with BuildLine():
            ThreePointArc((7.05572809, -36.9322024461), (5.5410691968, -34.3788660388), (4.5242108664, -31.5896515423))
            Line((4.5242108664, -31.5896515423), (0, -34.8766831424))
            Line((0, -34.8766831424), (-4.5242108664, -31.5896515423))
            ThreePointArc((-4.5242108664, -31.5896515423), (-5.5410691968, -34.3788660388), (-7.05572809, -36.9322024461))
            Line((-7.05572809, -36.9322024461), (0, -42.0584889695))
            Line((0, -42.0584889695), (7.05572809, -36.9322024461))
        make_face()
        with BuildLine():
            Line((-33.1696967694, -10.7774877984), (-31.4416019907, -5.4589589474))
            ThreePointArc((-31.4416019907, -5.4589589474), (-34.4085291179, -5.3537838864), (-37.304951685, -4.7022820183))
            Line((-37.304951685, -4.7022820183), (-40, -12.9967878493))
            Line((-40, -12.9967878493), (-32.94427191, -18.1230743727))
            ThreePointArc((-32.94427191, -18.1230743727), (-30.9839600202, -15.8935238202), (-28.645485903, -14.0645193985))
            Line((-28.645485903, -14.0645193985), (-33.1696967694, -10.7774877984))
        make_face()
        with BuildLine():
            Line((13.6547651702, -12.83961625), (11.4049670423, -9.7430347821))
            ThreePointArc((11.4049670423, -9.7430347821), (8.8167787844, -12.1352549156), (5.7418480816, -13.8575315481))
            Line((5.7418480816, -13.8575315481), (7.9916462096, -16.9541130161))
            ThreePointArc((7.9916462096, -16.9541130161), (10.5954359633, -14.5833664994), (13.6547651702, -12.83961625))
        make_face()
    extrude(amount=F1_DEPTH)


solid = f1.part
